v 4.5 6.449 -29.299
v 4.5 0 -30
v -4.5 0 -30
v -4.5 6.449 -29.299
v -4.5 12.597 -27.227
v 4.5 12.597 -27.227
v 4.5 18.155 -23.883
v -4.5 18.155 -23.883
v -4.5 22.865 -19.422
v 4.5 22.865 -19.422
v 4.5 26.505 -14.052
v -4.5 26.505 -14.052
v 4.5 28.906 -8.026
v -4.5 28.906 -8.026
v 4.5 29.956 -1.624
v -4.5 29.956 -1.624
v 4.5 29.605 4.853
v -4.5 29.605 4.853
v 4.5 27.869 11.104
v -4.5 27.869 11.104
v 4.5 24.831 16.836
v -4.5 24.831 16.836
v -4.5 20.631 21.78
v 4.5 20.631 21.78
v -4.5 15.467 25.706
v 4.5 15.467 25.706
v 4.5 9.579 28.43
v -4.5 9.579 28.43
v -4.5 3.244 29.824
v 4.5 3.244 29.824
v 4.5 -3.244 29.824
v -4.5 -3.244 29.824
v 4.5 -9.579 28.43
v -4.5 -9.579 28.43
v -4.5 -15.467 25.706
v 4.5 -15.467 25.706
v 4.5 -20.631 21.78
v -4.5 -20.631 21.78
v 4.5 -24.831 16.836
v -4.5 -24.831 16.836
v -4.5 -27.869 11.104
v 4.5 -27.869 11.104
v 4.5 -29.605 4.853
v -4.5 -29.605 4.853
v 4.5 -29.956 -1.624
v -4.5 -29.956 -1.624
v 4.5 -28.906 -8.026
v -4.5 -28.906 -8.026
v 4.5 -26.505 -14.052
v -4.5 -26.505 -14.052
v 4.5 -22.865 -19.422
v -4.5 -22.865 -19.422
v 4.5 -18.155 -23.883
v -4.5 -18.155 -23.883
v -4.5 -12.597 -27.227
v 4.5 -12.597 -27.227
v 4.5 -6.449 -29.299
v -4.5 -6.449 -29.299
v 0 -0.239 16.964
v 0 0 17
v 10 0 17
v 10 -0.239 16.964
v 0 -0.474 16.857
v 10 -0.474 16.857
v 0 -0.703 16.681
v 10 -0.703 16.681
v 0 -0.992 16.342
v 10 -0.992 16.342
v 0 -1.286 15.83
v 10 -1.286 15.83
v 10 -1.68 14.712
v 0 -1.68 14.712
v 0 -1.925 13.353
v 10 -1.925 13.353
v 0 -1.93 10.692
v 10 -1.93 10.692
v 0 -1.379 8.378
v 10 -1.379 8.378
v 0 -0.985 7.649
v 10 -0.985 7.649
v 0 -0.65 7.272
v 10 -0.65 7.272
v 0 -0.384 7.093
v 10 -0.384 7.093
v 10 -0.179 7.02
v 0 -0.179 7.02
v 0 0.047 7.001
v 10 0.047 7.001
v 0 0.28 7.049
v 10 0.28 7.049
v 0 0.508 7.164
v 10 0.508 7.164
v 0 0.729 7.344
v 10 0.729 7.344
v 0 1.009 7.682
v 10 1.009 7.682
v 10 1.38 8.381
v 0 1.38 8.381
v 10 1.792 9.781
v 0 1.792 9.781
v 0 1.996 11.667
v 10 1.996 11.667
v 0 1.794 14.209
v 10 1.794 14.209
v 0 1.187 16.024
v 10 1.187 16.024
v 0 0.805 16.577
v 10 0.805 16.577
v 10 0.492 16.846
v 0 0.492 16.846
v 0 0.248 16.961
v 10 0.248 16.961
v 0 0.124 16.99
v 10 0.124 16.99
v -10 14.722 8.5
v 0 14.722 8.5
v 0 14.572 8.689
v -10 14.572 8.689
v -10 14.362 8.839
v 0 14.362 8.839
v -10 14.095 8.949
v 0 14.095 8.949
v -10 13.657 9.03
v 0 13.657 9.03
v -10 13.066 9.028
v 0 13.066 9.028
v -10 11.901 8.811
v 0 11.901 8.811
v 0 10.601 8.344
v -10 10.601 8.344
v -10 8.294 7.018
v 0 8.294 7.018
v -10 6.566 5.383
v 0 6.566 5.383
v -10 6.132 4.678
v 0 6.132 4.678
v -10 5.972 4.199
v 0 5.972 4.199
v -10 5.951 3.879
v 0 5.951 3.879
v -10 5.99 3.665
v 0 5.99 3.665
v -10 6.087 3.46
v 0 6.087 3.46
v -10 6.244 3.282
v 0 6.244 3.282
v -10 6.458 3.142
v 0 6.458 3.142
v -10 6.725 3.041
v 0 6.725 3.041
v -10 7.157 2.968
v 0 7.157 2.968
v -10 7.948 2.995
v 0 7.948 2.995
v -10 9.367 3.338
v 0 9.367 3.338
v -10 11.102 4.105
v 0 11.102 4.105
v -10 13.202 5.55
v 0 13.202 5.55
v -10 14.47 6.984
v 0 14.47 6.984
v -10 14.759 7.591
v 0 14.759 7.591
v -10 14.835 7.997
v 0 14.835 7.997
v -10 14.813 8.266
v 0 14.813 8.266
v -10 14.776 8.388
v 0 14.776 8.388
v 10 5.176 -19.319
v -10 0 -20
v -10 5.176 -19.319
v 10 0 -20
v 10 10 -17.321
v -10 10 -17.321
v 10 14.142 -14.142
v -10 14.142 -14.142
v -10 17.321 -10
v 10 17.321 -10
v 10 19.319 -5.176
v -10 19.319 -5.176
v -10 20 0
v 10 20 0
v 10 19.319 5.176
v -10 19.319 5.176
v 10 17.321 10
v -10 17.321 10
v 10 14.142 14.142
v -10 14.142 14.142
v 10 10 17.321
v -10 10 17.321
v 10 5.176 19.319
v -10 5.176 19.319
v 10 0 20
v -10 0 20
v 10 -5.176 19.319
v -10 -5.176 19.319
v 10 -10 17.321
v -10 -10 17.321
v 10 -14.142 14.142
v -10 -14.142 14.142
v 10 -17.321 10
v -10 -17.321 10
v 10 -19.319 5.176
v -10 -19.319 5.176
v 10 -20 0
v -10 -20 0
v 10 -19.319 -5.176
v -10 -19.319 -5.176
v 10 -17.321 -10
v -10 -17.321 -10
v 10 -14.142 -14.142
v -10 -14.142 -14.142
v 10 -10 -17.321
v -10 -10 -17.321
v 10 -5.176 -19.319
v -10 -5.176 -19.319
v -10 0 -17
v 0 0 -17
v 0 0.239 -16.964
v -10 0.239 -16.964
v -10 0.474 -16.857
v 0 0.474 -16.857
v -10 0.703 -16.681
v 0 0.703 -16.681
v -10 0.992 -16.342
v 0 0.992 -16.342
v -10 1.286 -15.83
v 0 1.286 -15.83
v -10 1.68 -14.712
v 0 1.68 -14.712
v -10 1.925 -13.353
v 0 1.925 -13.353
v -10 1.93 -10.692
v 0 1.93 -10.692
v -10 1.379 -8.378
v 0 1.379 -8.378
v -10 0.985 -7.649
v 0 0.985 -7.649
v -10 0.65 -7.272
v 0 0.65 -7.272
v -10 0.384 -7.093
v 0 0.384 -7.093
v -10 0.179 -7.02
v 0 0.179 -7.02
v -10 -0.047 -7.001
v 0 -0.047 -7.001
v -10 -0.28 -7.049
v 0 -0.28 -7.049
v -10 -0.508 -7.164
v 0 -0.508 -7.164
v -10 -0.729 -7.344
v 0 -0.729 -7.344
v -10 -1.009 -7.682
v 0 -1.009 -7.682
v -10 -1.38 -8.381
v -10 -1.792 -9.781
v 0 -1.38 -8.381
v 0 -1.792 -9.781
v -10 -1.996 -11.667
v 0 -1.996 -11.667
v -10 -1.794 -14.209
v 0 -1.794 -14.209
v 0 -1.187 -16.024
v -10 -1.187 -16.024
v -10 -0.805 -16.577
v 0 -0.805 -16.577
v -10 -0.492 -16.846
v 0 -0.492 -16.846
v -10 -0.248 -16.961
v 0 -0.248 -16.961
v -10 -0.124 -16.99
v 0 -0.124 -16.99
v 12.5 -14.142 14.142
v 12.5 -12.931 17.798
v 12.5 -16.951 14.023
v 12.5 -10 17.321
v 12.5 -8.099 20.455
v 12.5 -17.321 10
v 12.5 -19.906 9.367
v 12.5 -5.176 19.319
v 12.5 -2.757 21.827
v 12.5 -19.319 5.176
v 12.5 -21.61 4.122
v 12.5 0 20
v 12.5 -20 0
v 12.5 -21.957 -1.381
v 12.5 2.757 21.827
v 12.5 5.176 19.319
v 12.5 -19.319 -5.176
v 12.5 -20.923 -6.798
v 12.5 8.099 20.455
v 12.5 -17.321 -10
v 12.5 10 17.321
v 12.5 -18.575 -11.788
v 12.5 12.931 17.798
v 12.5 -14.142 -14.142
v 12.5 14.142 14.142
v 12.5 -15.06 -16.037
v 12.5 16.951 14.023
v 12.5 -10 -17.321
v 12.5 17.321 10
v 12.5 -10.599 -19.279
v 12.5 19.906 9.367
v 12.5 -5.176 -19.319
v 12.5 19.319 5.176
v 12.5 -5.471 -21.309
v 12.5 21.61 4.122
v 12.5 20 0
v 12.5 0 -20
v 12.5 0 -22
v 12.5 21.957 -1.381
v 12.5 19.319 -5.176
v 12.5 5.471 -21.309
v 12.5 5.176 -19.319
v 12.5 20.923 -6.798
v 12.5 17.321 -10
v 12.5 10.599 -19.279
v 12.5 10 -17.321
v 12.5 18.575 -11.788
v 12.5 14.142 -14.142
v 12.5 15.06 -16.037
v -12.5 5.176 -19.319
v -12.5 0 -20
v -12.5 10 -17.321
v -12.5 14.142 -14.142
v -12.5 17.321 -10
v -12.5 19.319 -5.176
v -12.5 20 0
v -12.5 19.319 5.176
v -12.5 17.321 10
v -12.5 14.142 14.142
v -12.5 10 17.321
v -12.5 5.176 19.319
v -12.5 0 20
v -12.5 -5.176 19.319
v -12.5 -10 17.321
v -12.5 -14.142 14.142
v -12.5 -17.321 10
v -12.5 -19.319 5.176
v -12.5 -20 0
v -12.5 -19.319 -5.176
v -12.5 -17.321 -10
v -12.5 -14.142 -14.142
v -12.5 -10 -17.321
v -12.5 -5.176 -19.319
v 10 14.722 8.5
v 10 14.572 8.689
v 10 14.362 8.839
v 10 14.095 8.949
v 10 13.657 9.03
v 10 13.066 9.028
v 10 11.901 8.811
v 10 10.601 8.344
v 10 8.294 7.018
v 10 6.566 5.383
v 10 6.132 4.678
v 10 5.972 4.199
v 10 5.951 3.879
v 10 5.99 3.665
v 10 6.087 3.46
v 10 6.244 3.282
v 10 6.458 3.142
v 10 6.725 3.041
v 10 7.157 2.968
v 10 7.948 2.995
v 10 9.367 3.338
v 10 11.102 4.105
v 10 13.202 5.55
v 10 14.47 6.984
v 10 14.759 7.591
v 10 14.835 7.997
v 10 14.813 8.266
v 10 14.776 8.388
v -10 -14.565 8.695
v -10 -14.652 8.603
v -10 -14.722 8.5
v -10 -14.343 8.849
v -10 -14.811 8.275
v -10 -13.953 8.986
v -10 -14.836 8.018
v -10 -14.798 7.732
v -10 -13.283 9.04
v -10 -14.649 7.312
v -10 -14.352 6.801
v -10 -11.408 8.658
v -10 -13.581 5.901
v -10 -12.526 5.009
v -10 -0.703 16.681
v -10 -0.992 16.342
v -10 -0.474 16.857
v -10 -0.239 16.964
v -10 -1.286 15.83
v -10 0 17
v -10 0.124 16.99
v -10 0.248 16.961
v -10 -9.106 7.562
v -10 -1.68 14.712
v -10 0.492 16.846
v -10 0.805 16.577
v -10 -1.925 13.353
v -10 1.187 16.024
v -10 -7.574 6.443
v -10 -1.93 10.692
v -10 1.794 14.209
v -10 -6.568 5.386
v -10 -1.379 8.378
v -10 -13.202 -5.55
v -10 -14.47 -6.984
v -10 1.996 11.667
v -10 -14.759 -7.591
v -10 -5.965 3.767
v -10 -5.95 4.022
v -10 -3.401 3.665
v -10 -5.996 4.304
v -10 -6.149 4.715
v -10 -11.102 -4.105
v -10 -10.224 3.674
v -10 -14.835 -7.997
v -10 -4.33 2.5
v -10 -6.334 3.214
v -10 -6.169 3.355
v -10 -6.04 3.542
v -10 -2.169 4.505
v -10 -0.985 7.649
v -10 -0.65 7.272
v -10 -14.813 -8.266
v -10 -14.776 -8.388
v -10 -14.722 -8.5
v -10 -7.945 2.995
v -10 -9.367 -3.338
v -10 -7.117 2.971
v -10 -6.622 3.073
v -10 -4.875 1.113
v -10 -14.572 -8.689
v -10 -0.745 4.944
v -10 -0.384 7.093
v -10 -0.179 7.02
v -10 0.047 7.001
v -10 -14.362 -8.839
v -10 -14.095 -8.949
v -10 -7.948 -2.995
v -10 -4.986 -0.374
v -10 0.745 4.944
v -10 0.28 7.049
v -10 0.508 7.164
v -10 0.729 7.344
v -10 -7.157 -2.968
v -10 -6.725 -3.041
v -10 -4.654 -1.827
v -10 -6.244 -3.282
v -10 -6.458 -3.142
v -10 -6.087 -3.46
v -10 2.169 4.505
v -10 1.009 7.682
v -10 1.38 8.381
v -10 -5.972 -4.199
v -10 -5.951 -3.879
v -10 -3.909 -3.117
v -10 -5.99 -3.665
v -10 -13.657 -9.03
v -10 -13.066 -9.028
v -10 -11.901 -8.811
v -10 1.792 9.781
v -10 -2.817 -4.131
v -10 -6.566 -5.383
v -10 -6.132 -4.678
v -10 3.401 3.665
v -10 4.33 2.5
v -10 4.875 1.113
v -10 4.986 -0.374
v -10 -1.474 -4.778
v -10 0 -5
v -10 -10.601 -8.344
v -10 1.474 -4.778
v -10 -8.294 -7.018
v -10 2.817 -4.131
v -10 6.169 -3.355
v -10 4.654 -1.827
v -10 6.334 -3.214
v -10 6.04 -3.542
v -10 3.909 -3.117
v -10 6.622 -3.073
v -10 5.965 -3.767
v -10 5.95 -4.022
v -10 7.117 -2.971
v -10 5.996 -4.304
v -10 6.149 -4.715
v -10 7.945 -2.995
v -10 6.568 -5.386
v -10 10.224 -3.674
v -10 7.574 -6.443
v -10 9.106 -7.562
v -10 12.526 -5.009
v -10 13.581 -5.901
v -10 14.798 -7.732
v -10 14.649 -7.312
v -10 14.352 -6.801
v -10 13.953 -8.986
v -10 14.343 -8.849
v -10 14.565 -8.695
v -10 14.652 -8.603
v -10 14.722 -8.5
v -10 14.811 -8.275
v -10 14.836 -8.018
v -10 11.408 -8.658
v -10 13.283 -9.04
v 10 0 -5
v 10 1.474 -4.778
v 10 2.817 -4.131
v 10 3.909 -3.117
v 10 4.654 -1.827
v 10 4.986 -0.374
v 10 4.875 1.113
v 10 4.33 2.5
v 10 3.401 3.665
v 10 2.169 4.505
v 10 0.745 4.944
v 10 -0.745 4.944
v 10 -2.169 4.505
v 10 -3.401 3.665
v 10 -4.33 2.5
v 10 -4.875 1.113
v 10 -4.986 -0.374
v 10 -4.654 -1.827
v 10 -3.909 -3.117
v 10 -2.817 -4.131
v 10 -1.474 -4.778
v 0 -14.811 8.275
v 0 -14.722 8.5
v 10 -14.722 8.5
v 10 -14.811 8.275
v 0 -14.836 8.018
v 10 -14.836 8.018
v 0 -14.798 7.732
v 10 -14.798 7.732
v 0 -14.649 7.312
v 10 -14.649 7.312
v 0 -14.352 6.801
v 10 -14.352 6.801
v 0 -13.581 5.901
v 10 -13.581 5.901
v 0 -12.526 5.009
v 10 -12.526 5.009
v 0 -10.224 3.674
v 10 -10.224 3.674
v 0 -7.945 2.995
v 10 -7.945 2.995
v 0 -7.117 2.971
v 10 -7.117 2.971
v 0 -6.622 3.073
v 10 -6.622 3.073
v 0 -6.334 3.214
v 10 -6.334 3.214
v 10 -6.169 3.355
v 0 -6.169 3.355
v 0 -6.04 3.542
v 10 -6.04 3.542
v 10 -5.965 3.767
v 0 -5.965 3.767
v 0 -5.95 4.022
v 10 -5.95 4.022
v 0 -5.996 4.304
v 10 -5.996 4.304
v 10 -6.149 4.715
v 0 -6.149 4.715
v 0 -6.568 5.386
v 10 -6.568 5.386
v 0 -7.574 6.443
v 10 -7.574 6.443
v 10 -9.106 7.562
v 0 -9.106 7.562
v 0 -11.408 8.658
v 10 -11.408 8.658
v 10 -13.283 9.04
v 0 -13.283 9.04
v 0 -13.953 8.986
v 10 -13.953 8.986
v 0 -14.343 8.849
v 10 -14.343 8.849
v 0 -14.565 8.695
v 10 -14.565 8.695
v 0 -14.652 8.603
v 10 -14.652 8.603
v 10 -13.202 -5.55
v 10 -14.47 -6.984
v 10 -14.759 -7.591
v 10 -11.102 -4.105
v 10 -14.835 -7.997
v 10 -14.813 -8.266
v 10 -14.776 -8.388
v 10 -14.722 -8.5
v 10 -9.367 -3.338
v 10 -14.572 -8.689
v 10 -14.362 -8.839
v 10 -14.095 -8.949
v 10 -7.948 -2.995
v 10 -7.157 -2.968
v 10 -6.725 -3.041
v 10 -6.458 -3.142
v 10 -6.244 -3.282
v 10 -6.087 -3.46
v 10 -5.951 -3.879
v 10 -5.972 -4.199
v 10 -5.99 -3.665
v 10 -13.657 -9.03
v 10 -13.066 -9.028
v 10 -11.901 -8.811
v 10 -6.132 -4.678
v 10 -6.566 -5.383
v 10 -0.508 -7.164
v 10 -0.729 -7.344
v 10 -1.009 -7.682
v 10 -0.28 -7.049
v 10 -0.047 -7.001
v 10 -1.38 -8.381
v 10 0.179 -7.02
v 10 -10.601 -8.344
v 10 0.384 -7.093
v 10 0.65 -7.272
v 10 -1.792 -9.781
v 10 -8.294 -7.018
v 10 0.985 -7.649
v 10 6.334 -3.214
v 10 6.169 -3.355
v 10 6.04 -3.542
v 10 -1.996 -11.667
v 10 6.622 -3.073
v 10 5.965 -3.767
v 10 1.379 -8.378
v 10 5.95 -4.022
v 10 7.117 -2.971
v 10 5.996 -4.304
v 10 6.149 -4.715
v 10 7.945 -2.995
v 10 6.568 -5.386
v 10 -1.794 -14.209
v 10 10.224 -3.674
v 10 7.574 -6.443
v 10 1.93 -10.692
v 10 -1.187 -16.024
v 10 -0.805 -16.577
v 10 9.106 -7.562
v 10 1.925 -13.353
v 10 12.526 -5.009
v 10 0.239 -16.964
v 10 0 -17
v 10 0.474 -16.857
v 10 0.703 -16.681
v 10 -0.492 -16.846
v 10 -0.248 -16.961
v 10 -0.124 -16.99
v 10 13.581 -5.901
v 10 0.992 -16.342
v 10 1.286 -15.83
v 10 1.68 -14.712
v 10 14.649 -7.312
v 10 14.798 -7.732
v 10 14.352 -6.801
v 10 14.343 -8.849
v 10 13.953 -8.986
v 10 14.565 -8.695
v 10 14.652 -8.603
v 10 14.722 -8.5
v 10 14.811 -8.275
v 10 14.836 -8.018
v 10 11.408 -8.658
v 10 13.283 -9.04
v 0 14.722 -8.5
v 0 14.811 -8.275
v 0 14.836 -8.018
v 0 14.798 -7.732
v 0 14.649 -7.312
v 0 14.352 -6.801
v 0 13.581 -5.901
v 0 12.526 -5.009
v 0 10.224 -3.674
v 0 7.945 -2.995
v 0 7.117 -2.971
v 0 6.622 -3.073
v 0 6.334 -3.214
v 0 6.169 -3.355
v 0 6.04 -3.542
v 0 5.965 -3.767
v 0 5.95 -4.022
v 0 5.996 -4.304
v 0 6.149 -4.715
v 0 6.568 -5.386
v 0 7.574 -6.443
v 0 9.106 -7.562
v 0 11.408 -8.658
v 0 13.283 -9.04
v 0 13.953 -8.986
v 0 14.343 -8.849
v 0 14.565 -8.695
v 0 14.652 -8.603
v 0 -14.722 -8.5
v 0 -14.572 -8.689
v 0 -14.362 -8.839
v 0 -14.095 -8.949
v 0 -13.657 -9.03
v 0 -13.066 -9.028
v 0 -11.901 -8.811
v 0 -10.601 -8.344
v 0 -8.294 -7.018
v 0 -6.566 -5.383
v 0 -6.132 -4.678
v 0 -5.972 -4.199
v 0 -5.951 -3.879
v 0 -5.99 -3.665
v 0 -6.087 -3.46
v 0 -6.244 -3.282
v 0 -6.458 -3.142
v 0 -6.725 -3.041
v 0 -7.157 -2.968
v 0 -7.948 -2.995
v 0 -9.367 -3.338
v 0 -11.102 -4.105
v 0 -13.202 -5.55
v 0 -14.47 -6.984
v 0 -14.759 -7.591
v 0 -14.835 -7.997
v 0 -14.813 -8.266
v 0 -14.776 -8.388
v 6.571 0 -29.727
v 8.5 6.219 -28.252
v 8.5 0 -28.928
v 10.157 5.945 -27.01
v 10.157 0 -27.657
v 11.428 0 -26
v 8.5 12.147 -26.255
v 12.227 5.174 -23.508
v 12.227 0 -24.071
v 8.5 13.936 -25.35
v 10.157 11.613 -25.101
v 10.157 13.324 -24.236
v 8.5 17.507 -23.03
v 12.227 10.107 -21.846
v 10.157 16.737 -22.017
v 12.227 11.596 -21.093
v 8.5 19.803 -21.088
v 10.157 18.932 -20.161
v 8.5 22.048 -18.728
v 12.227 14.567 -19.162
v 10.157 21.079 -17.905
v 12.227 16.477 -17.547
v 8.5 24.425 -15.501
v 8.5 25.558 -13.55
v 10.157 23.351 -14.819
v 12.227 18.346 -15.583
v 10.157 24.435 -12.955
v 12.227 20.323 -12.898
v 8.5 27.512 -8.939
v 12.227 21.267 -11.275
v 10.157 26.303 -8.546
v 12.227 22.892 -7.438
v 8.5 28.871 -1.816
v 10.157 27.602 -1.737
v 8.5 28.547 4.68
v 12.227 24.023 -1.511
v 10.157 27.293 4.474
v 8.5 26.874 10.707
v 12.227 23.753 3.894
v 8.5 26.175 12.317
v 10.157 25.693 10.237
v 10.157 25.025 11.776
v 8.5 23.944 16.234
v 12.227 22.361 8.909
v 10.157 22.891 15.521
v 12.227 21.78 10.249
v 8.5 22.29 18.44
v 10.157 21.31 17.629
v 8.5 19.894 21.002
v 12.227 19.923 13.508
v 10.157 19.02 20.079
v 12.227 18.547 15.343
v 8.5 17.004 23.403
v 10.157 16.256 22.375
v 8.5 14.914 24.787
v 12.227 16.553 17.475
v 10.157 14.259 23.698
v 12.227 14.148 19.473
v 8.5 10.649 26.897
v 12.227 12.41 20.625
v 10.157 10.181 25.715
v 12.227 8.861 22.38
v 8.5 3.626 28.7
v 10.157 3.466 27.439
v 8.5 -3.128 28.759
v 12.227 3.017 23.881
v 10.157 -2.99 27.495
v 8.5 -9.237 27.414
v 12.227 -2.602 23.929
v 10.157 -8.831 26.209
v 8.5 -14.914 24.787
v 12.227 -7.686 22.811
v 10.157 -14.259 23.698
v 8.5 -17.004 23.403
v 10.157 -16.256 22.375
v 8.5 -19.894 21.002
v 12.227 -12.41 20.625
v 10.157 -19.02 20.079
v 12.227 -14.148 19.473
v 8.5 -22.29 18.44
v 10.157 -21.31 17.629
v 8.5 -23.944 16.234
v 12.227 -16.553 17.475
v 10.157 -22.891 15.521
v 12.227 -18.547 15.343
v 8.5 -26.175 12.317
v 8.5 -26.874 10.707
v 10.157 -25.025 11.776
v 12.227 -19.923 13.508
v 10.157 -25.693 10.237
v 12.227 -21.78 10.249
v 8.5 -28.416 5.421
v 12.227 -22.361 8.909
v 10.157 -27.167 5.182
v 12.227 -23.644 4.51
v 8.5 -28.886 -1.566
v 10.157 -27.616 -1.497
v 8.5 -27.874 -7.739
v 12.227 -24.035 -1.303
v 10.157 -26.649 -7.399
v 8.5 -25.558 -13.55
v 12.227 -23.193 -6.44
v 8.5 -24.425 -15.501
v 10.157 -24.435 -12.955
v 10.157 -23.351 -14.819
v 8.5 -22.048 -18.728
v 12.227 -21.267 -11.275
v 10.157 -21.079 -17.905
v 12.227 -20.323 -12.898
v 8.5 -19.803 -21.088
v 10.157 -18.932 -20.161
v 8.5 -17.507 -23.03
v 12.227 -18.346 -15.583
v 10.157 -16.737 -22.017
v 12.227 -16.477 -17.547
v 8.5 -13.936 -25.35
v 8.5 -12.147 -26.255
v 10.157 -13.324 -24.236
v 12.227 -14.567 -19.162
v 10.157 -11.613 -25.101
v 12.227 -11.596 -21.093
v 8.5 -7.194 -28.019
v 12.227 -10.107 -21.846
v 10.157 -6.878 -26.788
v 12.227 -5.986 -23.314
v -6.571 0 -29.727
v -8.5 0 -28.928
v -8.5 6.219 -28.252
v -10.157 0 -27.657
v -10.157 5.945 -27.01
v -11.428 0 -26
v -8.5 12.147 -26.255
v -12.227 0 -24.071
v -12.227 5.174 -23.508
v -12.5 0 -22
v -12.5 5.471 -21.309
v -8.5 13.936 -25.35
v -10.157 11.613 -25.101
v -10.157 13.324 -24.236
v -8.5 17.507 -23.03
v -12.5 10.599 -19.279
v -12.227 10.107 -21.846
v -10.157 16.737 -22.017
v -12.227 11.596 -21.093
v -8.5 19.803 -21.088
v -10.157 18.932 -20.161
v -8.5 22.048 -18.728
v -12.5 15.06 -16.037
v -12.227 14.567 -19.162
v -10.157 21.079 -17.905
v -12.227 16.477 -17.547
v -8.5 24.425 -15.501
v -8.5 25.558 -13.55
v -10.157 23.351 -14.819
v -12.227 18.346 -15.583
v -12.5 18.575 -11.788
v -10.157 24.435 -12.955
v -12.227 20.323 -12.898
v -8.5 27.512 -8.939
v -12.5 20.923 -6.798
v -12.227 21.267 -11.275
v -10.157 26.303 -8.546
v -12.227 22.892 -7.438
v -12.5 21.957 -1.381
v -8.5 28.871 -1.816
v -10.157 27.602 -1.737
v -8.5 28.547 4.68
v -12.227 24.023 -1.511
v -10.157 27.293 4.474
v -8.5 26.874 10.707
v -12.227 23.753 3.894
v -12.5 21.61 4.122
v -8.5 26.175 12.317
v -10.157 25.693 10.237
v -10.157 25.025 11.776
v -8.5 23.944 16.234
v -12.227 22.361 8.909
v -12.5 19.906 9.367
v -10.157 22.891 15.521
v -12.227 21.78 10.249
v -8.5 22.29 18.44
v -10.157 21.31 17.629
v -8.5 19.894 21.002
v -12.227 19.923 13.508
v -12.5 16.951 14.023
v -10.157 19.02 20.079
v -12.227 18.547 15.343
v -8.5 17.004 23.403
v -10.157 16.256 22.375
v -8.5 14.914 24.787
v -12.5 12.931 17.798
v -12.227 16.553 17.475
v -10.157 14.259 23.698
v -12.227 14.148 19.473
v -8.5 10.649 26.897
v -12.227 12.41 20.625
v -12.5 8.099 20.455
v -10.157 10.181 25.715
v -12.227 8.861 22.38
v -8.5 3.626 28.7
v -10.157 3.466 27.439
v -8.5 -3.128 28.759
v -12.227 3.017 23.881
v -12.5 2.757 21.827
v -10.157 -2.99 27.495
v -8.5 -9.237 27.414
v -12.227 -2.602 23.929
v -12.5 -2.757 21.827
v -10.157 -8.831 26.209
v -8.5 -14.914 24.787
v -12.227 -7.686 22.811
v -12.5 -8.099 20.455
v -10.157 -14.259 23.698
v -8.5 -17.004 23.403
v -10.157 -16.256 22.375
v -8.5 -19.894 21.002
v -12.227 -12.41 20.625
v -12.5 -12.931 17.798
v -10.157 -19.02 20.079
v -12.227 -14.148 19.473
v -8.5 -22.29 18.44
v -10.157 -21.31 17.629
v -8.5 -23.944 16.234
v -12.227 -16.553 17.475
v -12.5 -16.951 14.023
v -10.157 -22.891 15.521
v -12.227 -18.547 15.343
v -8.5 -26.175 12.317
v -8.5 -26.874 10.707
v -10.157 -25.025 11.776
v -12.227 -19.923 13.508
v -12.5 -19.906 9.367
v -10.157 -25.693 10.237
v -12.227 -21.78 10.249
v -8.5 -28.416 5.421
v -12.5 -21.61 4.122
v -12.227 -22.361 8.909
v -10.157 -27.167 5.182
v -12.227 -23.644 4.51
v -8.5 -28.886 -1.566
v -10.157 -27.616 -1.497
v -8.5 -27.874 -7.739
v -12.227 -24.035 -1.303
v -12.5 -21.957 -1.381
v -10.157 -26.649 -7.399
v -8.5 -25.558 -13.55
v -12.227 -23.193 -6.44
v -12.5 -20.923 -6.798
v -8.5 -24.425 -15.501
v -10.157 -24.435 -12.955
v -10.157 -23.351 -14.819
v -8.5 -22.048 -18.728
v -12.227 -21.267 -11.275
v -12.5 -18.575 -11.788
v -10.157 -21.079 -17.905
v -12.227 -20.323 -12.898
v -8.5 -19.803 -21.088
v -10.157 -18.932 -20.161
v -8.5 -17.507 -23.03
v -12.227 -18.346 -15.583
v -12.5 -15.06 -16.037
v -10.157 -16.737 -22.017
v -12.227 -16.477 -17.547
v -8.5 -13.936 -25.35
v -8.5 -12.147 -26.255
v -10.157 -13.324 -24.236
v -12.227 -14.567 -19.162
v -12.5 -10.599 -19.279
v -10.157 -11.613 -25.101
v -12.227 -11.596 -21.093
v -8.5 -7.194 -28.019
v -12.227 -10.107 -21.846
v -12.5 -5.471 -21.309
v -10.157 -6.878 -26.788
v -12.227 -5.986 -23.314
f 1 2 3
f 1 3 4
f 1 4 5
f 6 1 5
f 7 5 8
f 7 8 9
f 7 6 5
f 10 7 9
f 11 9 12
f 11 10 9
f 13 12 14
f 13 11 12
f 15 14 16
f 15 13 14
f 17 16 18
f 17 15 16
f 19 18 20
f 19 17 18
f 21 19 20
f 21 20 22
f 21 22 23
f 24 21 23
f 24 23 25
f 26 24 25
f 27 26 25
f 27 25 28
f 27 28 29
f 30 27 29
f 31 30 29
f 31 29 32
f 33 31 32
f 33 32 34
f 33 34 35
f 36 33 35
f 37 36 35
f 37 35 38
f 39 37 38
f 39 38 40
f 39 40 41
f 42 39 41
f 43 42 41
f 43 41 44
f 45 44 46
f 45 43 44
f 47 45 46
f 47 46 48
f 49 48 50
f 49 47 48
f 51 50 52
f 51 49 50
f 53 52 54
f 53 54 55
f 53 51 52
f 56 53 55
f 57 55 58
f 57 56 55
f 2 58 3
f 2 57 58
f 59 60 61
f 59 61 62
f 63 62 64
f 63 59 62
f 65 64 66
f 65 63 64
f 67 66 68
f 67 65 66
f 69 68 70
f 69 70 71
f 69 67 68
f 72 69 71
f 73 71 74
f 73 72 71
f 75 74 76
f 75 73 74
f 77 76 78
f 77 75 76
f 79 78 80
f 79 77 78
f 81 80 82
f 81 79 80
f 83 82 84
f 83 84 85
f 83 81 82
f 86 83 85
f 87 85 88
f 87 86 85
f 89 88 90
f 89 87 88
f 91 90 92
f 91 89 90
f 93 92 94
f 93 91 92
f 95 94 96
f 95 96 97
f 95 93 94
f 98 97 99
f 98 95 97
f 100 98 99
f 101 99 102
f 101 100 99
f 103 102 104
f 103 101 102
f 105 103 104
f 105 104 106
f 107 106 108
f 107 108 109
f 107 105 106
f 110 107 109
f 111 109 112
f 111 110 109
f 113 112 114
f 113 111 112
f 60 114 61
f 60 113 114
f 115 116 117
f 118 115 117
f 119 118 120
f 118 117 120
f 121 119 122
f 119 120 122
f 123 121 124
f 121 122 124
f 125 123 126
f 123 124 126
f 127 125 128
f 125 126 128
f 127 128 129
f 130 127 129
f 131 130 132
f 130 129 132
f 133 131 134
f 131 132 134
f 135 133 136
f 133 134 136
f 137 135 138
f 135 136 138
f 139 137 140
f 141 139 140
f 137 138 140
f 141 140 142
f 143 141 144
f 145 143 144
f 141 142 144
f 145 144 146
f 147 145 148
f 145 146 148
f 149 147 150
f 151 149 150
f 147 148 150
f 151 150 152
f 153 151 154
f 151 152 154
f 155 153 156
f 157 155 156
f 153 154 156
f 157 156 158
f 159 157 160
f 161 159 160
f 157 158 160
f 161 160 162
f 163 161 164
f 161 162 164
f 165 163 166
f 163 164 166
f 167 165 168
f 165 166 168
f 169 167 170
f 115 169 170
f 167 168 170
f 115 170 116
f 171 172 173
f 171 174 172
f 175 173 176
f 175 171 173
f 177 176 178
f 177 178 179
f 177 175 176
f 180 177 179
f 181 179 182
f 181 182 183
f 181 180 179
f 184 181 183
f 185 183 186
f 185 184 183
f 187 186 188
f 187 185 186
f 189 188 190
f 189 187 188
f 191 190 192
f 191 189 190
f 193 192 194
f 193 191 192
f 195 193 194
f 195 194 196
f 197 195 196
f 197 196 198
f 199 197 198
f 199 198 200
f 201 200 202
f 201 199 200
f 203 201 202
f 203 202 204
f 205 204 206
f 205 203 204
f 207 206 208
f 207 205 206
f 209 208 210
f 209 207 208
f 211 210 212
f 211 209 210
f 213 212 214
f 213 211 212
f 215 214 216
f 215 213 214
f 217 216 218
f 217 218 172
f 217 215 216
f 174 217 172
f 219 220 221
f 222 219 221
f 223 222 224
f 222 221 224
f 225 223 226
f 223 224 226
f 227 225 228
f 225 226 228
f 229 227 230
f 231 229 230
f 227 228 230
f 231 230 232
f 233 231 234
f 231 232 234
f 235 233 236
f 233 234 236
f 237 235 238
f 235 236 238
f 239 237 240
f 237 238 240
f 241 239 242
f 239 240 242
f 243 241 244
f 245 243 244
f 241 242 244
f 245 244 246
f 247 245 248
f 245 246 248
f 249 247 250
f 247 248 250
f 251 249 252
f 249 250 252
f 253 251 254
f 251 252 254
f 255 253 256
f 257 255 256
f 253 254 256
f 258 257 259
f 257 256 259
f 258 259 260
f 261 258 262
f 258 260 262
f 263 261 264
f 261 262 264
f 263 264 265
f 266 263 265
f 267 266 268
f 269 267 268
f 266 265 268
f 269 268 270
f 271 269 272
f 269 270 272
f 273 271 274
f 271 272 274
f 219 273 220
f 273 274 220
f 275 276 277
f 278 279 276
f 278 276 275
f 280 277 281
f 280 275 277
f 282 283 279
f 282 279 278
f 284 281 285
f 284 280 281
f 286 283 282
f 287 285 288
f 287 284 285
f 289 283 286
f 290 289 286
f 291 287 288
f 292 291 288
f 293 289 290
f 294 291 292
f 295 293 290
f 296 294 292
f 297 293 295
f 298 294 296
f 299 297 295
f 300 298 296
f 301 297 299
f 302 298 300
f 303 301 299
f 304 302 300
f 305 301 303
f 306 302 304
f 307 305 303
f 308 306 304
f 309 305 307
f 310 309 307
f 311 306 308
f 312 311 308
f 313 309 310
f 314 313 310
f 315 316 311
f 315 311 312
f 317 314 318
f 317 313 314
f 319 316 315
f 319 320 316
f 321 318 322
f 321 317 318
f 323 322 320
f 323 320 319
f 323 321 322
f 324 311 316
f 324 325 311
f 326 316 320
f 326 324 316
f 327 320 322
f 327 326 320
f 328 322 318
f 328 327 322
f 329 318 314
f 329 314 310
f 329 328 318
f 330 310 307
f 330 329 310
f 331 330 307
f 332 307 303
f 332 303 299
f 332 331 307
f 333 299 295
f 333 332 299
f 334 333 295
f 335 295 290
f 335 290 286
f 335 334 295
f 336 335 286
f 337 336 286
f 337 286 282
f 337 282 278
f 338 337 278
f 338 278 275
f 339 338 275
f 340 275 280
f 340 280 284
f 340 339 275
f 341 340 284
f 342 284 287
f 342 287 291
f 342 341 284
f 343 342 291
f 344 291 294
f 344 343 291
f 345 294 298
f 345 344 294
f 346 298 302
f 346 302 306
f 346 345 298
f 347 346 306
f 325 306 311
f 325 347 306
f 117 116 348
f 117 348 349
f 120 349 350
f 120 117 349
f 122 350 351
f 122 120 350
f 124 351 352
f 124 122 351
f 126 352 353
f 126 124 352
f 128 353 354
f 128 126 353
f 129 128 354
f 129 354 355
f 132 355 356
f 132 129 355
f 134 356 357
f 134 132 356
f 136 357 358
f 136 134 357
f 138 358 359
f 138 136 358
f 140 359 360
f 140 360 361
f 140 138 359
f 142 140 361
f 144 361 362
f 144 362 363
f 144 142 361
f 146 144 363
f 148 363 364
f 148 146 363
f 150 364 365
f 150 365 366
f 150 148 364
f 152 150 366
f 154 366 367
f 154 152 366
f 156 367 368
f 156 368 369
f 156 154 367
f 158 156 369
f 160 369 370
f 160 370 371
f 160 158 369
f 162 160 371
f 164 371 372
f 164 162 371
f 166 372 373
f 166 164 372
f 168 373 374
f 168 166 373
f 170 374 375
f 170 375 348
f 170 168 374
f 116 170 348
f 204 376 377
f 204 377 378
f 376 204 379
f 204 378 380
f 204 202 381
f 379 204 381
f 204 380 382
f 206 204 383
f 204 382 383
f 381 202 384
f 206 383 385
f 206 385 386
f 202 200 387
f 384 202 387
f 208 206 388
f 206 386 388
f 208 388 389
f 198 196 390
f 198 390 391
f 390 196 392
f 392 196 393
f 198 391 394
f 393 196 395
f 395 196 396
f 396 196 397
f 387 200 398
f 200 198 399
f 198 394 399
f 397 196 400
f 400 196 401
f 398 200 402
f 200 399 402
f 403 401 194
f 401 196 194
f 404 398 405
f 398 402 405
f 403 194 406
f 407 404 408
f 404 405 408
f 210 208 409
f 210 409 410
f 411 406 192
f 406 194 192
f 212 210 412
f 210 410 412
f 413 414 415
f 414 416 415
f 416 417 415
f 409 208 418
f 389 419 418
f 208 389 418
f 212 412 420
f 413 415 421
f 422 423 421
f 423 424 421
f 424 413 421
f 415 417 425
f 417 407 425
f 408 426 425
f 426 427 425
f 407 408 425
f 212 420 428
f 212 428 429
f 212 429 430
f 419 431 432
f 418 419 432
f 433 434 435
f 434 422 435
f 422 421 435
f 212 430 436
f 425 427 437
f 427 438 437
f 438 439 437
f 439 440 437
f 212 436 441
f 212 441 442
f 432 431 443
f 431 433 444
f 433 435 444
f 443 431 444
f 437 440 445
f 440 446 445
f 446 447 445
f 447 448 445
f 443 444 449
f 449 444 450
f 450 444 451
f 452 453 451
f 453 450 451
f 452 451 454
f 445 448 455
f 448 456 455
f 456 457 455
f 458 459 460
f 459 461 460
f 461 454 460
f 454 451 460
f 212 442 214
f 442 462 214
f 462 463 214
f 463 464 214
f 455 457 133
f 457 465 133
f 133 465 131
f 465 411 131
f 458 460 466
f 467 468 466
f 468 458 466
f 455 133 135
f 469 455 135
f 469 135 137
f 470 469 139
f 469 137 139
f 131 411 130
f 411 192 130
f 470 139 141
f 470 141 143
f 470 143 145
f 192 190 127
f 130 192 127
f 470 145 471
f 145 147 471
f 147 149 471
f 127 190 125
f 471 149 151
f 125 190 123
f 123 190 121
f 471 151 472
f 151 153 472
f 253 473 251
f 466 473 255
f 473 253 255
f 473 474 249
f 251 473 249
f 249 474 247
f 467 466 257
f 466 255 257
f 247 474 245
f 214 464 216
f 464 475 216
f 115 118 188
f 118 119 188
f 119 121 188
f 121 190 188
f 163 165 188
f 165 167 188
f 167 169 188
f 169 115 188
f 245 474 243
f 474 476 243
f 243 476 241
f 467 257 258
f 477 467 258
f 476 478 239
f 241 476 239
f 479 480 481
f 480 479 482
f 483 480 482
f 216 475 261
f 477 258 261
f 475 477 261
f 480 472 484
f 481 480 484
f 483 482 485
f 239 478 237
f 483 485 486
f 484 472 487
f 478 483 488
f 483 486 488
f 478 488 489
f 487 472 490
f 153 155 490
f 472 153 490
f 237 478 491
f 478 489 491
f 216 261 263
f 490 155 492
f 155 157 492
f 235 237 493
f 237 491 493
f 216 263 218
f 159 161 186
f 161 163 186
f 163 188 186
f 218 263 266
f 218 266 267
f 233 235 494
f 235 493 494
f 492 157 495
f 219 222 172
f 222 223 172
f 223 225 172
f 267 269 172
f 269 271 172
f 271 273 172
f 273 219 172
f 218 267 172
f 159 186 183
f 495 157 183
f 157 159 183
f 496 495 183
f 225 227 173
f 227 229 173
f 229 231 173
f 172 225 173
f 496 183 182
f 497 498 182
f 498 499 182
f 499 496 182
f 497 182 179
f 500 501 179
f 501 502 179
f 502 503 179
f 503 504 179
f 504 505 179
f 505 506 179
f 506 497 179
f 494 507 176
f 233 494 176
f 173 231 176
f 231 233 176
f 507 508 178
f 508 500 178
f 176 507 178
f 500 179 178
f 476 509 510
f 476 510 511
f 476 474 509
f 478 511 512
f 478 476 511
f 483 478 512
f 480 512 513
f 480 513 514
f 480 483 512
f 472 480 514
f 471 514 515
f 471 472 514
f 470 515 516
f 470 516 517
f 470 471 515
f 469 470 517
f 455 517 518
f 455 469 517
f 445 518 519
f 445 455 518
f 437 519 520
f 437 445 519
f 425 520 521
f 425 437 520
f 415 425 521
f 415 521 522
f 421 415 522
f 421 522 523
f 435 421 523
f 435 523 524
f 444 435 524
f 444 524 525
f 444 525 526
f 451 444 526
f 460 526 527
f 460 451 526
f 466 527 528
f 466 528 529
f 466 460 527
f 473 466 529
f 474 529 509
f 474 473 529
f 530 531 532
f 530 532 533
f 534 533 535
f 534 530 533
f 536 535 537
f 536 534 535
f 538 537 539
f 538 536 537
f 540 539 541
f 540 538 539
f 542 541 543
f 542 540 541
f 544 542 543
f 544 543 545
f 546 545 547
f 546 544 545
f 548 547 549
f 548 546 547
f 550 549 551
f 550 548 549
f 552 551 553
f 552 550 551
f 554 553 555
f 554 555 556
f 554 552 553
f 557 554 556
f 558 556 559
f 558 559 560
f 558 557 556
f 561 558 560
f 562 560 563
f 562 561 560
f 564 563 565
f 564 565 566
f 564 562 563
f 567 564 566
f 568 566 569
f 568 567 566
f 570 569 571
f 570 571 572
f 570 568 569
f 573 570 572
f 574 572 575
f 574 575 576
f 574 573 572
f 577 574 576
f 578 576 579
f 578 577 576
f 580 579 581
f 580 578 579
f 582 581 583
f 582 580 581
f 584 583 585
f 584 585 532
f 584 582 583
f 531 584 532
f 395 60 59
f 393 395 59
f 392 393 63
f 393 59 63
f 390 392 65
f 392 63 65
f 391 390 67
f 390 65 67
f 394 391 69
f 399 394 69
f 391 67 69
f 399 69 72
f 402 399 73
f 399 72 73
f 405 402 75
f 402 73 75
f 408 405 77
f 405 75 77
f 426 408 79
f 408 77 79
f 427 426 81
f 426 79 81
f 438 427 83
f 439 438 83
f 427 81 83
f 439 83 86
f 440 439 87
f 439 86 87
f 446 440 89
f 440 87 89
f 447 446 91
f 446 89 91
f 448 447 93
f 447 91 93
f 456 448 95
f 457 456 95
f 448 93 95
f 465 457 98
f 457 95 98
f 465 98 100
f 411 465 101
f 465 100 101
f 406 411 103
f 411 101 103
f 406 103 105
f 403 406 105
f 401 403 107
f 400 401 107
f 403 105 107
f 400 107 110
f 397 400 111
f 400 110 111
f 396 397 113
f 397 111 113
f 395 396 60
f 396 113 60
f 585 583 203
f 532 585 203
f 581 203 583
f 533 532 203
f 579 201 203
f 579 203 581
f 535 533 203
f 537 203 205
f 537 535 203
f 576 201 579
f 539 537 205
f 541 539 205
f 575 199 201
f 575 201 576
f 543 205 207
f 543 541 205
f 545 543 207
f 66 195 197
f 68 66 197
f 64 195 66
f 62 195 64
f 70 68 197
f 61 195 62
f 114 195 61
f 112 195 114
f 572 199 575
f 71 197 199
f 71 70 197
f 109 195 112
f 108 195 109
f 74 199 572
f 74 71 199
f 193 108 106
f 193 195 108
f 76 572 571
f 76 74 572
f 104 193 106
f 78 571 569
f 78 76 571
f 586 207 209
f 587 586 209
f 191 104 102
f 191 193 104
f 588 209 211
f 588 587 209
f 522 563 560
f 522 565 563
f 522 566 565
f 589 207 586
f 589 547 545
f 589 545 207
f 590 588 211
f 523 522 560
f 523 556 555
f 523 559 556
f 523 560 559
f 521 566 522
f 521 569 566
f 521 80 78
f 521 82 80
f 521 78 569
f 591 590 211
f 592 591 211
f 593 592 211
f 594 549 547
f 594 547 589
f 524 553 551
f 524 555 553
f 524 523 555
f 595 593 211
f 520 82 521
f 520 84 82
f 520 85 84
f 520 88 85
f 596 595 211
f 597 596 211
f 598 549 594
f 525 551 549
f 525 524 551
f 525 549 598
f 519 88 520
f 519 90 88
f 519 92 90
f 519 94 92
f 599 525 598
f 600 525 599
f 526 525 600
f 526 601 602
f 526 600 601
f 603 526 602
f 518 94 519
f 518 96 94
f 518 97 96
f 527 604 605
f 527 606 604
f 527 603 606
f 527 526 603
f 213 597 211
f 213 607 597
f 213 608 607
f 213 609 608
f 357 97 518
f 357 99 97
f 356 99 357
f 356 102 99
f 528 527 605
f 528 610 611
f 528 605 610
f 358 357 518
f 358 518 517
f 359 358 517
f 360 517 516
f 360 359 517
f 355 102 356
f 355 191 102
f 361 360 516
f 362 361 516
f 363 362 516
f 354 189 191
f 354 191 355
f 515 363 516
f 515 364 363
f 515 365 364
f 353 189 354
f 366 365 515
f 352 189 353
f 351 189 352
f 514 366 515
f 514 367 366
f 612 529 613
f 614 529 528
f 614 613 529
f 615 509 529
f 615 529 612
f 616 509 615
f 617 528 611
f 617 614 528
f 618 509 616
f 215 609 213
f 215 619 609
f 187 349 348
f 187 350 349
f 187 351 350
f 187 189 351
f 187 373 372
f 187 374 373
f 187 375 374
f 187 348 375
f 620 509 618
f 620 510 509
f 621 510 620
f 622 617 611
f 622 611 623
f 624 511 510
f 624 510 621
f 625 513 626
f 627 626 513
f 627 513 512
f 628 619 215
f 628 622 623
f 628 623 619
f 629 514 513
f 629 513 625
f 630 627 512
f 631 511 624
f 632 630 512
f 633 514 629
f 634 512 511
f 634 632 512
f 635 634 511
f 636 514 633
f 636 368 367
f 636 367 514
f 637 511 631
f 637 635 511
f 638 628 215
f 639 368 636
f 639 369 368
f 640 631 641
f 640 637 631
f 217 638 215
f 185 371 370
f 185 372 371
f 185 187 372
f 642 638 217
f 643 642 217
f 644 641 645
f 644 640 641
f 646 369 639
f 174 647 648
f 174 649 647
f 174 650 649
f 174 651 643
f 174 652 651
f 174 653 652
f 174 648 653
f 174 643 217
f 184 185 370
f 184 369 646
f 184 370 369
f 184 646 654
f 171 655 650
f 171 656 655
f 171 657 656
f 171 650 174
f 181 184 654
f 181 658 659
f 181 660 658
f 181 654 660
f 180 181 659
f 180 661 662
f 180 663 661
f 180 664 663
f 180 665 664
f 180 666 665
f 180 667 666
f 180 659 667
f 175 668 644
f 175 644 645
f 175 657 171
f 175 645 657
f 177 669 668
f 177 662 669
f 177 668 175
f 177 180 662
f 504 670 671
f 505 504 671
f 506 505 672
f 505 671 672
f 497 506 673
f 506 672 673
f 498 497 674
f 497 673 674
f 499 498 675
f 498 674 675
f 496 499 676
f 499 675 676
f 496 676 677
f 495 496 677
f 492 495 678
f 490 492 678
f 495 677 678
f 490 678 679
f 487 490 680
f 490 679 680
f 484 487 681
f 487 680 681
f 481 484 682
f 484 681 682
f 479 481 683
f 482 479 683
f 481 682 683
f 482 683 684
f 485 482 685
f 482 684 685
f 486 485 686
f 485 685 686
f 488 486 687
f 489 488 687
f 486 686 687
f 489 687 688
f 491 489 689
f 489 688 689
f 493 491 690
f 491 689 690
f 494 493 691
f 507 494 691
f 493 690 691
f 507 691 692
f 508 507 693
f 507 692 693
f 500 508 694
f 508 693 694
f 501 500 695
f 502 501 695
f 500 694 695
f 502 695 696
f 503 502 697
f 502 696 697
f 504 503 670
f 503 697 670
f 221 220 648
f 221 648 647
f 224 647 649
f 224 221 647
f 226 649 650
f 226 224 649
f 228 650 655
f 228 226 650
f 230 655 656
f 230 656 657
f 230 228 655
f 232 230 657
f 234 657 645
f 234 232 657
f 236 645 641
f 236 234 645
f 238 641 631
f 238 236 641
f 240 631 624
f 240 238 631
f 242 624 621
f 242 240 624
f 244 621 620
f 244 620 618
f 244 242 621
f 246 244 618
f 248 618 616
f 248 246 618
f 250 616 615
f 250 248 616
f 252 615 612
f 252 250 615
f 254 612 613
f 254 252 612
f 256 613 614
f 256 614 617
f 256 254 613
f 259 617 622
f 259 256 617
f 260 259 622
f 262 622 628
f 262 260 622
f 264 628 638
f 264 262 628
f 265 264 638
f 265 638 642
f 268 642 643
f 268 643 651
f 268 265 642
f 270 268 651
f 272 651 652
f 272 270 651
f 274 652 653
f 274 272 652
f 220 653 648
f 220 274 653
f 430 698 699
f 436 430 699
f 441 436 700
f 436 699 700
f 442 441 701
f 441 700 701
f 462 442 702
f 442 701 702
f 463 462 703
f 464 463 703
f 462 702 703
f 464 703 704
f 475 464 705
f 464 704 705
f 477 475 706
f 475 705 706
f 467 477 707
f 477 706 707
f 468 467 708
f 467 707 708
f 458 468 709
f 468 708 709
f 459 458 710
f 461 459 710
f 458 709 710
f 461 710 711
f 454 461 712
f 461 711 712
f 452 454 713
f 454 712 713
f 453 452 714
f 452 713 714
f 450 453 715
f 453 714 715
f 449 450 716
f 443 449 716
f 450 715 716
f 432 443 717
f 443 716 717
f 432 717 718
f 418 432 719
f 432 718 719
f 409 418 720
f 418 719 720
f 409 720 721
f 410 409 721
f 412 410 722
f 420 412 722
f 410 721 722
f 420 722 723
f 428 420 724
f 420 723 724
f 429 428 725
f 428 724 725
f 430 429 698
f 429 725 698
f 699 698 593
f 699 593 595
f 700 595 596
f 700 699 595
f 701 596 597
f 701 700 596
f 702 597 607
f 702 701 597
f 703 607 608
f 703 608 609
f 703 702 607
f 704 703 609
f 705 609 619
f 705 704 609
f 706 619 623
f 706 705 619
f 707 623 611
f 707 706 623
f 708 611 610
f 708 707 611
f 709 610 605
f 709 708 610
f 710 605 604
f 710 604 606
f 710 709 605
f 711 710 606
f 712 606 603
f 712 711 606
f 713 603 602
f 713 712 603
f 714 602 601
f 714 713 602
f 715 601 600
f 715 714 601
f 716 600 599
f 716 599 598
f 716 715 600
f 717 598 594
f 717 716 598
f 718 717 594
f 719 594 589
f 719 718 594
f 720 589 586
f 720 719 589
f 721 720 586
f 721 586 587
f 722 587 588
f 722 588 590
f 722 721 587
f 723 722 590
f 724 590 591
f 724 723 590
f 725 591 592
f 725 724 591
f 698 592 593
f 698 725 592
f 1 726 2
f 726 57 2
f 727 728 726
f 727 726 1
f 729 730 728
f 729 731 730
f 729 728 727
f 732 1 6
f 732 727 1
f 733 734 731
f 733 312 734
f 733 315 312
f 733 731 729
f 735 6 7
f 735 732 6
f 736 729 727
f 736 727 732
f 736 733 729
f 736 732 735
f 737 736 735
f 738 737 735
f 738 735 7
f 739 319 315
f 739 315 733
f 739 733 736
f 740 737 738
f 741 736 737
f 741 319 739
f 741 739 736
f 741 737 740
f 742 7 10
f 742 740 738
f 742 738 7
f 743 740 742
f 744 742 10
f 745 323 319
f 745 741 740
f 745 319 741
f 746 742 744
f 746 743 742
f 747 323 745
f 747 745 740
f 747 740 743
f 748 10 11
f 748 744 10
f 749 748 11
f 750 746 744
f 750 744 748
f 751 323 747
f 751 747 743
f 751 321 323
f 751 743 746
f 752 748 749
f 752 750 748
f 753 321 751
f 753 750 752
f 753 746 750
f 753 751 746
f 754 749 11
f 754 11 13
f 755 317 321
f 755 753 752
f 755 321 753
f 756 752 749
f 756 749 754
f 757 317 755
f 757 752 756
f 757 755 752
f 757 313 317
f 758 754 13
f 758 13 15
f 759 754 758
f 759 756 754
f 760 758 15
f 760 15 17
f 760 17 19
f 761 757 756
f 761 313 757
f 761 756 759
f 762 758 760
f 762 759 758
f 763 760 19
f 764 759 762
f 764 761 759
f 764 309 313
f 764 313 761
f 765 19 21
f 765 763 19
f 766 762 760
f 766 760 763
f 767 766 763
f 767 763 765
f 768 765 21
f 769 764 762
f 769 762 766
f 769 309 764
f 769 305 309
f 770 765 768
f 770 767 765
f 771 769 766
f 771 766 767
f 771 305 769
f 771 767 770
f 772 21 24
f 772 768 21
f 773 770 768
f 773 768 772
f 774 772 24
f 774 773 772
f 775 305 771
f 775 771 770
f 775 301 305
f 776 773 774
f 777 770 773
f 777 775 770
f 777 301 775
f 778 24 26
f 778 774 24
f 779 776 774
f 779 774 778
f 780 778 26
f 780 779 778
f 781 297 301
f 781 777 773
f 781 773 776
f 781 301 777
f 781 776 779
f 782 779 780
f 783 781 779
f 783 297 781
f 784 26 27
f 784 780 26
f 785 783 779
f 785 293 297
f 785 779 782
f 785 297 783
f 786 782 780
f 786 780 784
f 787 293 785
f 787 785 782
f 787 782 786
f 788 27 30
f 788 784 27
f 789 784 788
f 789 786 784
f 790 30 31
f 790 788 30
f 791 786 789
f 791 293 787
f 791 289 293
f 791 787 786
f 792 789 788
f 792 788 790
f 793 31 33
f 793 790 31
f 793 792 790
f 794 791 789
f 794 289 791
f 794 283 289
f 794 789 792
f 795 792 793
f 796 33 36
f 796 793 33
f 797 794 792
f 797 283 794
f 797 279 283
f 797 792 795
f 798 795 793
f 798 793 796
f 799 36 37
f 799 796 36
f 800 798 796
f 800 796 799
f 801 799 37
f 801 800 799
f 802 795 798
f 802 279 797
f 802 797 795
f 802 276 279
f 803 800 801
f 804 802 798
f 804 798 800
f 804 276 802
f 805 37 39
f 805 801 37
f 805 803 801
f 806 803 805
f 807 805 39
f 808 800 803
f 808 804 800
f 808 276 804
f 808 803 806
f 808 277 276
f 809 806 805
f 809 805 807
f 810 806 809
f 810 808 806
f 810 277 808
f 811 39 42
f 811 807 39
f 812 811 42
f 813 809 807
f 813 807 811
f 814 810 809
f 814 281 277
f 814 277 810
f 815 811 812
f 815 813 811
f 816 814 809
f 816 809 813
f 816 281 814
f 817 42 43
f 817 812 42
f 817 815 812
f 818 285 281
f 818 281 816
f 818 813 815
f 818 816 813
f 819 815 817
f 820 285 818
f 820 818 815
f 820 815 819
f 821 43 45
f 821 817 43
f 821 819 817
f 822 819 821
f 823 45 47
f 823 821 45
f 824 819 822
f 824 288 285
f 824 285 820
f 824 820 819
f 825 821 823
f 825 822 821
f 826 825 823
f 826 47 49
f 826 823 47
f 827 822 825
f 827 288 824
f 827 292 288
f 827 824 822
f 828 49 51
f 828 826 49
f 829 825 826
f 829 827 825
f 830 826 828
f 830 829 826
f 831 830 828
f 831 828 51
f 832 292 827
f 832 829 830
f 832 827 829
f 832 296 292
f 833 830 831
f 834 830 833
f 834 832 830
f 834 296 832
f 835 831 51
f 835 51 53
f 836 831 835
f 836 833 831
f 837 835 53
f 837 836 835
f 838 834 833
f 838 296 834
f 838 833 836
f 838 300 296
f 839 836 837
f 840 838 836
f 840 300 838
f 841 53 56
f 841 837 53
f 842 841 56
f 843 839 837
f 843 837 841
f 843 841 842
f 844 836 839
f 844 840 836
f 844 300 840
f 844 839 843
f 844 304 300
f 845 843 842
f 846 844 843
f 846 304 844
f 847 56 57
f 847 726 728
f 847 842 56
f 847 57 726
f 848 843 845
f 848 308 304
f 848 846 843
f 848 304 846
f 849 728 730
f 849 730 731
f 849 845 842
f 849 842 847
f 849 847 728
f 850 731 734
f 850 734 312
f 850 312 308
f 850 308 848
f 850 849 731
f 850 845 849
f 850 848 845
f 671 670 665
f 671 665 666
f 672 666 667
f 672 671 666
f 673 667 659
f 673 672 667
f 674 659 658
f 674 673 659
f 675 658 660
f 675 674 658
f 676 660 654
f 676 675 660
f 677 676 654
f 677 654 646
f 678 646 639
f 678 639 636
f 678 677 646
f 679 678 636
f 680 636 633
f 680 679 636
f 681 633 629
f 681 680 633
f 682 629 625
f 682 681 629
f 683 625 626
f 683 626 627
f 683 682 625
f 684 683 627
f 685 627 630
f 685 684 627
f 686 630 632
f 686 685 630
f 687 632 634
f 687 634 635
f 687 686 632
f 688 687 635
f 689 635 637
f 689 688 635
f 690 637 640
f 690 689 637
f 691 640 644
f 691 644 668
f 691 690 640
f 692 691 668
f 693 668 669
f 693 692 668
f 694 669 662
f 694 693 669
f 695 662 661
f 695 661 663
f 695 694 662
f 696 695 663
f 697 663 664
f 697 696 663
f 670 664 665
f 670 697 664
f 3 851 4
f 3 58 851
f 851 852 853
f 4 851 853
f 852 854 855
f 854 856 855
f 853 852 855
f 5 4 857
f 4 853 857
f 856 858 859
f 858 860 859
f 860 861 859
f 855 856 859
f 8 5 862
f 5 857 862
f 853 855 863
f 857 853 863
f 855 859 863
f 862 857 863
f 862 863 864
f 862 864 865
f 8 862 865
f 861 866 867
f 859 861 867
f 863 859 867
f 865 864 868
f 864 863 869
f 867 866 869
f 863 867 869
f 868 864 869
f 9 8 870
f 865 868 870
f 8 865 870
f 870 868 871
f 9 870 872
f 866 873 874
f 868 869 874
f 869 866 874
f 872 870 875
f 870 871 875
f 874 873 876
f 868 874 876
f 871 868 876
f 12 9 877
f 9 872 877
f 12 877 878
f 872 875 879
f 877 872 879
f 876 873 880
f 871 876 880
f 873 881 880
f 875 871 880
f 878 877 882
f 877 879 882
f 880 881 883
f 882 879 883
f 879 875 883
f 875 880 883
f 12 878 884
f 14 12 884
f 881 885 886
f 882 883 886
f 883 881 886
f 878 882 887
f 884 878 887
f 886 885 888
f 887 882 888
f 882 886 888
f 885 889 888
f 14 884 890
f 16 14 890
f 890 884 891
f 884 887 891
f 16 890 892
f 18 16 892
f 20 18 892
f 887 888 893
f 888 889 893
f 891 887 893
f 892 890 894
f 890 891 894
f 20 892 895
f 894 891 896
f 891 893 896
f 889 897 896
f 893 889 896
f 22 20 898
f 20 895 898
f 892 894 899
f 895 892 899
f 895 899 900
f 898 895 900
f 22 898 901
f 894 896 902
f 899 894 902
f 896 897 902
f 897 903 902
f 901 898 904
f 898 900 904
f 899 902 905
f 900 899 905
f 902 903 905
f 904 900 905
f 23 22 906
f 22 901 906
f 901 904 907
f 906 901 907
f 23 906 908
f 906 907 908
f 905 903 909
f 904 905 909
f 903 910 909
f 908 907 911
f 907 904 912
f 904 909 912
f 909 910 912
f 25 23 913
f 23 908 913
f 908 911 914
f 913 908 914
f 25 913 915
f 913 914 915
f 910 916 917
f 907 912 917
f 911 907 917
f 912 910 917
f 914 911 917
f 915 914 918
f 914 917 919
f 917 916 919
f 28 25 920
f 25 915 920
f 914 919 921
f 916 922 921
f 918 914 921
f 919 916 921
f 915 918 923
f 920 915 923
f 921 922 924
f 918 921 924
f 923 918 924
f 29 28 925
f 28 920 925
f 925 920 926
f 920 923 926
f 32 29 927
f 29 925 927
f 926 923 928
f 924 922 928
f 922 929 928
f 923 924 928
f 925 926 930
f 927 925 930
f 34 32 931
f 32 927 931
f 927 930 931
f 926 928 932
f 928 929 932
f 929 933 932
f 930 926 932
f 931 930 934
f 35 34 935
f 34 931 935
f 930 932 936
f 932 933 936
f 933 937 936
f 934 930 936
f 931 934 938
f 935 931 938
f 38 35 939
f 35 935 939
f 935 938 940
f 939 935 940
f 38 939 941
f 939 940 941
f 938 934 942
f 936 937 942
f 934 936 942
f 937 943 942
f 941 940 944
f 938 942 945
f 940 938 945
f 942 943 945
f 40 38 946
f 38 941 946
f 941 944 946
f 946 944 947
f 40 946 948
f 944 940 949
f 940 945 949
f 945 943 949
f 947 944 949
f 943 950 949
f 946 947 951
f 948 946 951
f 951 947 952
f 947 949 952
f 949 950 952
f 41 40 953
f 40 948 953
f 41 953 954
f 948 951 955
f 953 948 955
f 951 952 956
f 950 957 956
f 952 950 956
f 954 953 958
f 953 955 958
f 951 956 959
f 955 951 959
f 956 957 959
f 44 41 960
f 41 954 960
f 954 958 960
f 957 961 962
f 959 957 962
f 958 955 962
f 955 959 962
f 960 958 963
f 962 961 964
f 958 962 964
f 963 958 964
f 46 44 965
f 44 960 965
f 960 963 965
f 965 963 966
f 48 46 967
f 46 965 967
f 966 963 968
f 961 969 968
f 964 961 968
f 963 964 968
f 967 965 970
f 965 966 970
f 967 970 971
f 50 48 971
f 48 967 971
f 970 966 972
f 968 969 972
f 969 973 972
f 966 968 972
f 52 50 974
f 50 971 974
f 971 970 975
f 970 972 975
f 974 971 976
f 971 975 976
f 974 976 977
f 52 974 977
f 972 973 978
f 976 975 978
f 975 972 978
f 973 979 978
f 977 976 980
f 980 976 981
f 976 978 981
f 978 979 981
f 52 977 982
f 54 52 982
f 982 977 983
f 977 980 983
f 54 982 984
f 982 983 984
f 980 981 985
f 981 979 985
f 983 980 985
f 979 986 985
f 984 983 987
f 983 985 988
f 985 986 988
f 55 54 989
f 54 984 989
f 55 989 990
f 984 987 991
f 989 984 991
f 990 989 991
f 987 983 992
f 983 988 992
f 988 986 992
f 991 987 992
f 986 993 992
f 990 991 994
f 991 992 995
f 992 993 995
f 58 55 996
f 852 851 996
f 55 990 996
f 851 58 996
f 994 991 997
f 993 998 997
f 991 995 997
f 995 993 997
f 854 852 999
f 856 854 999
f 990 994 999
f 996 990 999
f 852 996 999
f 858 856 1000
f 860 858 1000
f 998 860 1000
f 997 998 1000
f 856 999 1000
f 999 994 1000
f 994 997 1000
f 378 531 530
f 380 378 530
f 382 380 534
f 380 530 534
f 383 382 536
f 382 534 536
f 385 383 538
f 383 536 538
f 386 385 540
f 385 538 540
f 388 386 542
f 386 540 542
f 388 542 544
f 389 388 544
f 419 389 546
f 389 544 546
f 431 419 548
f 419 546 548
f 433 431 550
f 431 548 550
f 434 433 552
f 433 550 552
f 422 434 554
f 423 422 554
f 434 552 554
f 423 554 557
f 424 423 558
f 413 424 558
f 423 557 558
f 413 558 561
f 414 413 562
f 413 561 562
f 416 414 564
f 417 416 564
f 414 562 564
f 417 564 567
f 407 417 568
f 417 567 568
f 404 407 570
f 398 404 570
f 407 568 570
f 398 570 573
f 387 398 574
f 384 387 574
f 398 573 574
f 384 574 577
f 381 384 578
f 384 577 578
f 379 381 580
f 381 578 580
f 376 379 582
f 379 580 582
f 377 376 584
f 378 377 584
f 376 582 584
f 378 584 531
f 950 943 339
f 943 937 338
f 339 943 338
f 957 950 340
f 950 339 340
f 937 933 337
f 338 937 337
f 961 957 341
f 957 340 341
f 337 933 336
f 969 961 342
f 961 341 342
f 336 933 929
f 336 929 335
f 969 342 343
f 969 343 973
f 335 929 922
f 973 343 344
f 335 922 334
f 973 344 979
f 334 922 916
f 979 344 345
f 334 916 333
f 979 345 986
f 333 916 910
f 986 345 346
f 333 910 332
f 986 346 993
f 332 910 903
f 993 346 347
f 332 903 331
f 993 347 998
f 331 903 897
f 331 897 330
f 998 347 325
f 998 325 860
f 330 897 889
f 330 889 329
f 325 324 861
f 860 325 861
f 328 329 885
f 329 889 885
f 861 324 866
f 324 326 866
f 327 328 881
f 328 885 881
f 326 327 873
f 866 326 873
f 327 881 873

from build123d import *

# Parameters (mm, degrees)
SKETCH1_R           = 30
SKETCH1_R_2         = 20
BOSS_EXTRUDE1_DEPTH = 12.5
FILLET1_R           = 8
SKETCH2_R           = 20
SKETCH2_R_2         = 5
SKETCH2_RX          = 5
SKETCH2_RY          = 2
BOSS_EXTRUDE3_DEPTH = 10


with BuildPart() as part:
    # Sketch1 → Boss-Extrude1 (new, symmetric)
    with BuildSketch(Plane(origin=(0, 0, 0), x_dir=(0, 0, -1), z_dir=(1, 0, 0))):
        Circle(SKETCH1_R)
        Circle(SKETCH1_R_2, mode=Mode.SUBTRACT)
    extrude(amount=BOSS_EXTRUDE1_DEPTH, both=True)

    # Fillet1
    fillet1_edges = [part.edges().sort_by_distance(p)[0] for p in [
        (-12.5, 0, 30),
        (12.5, 0, 30),
    ]]
    fillet(fillet1_edges, radius=FILLET1_R)


with BuildPart() as body_2:
    # Sketch2 → Boss-Extrude3 (new, symmetric)
    with BuildSketch(Plane(origin=(0, 0, 0), x_dir=(0, 0, -1), z_dir=(1, 0, 0))):
        Circle(SKETCH2_R)
        Circle(SKETCH2_R_2, mode=Mode.SUBTRACT)
        with Locations(Location((-12, 0), (0, 0, 180))):
            Ellipse(SKETCH2_RX, SKETCH2_RY, mode=Mode.SUBTRACT)
        with Locations(Location((-6, 10.392304845), (0, 0, 120))):
            Ellipse(SKETCH2_RX, SKETCH2_RY, mode=Mode.SUBTRACT)
        with Locations(Location((6, 10.392304845), (0, 0, 60))):
            Ellipse(SKETCH2_RX, SKETCH2_RY, mode=Mode.SUBTRACT)
        with Locations(Location((12, 0), (0, 0, 0))):
            Ellipse(SKETCH2_RX, SKETCH2_RY, mode=Mode.SUBTRACT)
        with Locations(Location((6, -10.392304845), (0, 0, -60))):
            Ellipse(SKETCH2_RX, SKETCH2_RY, mode=Mode.SUBTRACT)
        with Locations(Location((-6, -10.392304845), (0, 0, -120))):
            Ellipse(SKETCH2_RX, SKETCH2_RY, mode=Mode.SUBTRACT)
    extrude(amount=BOSS_EXTRUDE3_DEPTH, both=True)


solid = Compound([part.part, body_2.part])
